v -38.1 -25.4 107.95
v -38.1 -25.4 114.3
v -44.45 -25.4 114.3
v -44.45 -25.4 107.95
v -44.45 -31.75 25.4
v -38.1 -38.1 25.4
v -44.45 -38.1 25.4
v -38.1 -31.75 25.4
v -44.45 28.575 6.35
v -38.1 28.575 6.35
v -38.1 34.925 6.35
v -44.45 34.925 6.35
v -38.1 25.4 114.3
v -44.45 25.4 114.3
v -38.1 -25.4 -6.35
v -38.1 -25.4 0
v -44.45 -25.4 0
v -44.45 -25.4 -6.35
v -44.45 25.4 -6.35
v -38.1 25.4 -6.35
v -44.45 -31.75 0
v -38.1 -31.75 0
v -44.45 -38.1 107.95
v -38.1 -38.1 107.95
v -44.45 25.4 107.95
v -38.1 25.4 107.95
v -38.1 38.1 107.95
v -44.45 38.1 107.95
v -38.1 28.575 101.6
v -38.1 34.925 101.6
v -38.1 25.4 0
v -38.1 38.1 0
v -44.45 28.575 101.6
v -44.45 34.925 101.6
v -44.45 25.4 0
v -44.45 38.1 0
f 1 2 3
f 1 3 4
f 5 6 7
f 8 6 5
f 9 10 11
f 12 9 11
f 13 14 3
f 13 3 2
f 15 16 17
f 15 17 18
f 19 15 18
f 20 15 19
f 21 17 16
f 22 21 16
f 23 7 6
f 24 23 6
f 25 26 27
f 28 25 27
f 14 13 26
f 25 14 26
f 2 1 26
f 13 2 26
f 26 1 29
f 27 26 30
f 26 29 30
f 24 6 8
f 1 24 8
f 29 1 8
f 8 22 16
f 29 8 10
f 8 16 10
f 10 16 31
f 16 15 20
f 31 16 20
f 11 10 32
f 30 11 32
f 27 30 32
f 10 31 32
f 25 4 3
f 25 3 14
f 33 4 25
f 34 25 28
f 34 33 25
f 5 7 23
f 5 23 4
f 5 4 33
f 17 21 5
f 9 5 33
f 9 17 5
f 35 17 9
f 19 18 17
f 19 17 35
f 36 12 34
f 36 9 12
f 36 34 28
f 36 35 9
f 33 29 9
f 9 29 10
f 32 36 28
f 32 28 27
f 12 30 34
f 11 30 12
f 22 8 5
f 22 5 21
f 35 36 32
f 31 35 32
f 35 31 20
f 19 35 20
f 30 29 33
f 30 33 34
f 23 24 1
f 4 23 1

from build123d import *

# Parameters (mm, degrees)
SKETCH1_W           = 6.35
SKETCH1_H           = 76.2
BOSS_EXTRUDE1_DEPTH = 114.3
SKETCH2_W           = 6.35
SKETCH2_H           = 50.8
BOSS_EXTRUDE2_DEPTH = 6.35
SKETCH3_W           = 6.35
SKETCH3_H           = 12.7
SKETCH3_W_2         = 95.25
SKETCH3_H_2         = 6.35
SKETCH3_W_3         = 25.4
CUT_EXTRUDE1_DEPTH  = 121.65


with BuildPart() as part:
    # Sketch1 → Boss-Extrude1 (new body)
    with BuildSketch(Plane.XY):
        with Locations((-41.275, 0)):
            Rectangle(SKETCH1_W, SKETCH1_H)
    extrude(amount=BOSS_EXTRUDE1_DEPTH)

    # Sketch2 → Boss-Extrude2 (add, through all)
    with BuildSketch(Plane(origin=(-38.1, 0, 0), x_dir=(0, 0, -1), z_dir=(1, 0, 0))):
        with Locations((3.175, 0)):
            Rectangle(SKETCH2_W, SKETCH2_H)
    extrude(amount=-BOSS_EXTRUDE2_DEPTH)

    # Sketch3 → Cut-Extrude1 (cut, through all)
    with BuildSketch(Plane(origin=(-38.1, 0, 0), x_dir=(0, 0, -1), z_dir=(1, 0, 0))):
        with Locations((-111.125, -31.75)):
            Rectangle(SKETCH3_W, SKETCH3_H)
        with Locations((-111.125, 31.75)):
            Rectangle(SKETCH3_W, SKETCH3_H)
        with Locations((-53.975, 31.75)):
            Rectangle(SKETCH3_W_2, SKETCH3_H_2)
        with Locations((-12.7, -34.925)):
            Rectangle(SKETCH3_W_3, SKETCH3_H_2)
    extrude(amount=-CUT_EXTRUDE1_DEPTH, mode=Mode.SUBTRACT)


solid = part.part
